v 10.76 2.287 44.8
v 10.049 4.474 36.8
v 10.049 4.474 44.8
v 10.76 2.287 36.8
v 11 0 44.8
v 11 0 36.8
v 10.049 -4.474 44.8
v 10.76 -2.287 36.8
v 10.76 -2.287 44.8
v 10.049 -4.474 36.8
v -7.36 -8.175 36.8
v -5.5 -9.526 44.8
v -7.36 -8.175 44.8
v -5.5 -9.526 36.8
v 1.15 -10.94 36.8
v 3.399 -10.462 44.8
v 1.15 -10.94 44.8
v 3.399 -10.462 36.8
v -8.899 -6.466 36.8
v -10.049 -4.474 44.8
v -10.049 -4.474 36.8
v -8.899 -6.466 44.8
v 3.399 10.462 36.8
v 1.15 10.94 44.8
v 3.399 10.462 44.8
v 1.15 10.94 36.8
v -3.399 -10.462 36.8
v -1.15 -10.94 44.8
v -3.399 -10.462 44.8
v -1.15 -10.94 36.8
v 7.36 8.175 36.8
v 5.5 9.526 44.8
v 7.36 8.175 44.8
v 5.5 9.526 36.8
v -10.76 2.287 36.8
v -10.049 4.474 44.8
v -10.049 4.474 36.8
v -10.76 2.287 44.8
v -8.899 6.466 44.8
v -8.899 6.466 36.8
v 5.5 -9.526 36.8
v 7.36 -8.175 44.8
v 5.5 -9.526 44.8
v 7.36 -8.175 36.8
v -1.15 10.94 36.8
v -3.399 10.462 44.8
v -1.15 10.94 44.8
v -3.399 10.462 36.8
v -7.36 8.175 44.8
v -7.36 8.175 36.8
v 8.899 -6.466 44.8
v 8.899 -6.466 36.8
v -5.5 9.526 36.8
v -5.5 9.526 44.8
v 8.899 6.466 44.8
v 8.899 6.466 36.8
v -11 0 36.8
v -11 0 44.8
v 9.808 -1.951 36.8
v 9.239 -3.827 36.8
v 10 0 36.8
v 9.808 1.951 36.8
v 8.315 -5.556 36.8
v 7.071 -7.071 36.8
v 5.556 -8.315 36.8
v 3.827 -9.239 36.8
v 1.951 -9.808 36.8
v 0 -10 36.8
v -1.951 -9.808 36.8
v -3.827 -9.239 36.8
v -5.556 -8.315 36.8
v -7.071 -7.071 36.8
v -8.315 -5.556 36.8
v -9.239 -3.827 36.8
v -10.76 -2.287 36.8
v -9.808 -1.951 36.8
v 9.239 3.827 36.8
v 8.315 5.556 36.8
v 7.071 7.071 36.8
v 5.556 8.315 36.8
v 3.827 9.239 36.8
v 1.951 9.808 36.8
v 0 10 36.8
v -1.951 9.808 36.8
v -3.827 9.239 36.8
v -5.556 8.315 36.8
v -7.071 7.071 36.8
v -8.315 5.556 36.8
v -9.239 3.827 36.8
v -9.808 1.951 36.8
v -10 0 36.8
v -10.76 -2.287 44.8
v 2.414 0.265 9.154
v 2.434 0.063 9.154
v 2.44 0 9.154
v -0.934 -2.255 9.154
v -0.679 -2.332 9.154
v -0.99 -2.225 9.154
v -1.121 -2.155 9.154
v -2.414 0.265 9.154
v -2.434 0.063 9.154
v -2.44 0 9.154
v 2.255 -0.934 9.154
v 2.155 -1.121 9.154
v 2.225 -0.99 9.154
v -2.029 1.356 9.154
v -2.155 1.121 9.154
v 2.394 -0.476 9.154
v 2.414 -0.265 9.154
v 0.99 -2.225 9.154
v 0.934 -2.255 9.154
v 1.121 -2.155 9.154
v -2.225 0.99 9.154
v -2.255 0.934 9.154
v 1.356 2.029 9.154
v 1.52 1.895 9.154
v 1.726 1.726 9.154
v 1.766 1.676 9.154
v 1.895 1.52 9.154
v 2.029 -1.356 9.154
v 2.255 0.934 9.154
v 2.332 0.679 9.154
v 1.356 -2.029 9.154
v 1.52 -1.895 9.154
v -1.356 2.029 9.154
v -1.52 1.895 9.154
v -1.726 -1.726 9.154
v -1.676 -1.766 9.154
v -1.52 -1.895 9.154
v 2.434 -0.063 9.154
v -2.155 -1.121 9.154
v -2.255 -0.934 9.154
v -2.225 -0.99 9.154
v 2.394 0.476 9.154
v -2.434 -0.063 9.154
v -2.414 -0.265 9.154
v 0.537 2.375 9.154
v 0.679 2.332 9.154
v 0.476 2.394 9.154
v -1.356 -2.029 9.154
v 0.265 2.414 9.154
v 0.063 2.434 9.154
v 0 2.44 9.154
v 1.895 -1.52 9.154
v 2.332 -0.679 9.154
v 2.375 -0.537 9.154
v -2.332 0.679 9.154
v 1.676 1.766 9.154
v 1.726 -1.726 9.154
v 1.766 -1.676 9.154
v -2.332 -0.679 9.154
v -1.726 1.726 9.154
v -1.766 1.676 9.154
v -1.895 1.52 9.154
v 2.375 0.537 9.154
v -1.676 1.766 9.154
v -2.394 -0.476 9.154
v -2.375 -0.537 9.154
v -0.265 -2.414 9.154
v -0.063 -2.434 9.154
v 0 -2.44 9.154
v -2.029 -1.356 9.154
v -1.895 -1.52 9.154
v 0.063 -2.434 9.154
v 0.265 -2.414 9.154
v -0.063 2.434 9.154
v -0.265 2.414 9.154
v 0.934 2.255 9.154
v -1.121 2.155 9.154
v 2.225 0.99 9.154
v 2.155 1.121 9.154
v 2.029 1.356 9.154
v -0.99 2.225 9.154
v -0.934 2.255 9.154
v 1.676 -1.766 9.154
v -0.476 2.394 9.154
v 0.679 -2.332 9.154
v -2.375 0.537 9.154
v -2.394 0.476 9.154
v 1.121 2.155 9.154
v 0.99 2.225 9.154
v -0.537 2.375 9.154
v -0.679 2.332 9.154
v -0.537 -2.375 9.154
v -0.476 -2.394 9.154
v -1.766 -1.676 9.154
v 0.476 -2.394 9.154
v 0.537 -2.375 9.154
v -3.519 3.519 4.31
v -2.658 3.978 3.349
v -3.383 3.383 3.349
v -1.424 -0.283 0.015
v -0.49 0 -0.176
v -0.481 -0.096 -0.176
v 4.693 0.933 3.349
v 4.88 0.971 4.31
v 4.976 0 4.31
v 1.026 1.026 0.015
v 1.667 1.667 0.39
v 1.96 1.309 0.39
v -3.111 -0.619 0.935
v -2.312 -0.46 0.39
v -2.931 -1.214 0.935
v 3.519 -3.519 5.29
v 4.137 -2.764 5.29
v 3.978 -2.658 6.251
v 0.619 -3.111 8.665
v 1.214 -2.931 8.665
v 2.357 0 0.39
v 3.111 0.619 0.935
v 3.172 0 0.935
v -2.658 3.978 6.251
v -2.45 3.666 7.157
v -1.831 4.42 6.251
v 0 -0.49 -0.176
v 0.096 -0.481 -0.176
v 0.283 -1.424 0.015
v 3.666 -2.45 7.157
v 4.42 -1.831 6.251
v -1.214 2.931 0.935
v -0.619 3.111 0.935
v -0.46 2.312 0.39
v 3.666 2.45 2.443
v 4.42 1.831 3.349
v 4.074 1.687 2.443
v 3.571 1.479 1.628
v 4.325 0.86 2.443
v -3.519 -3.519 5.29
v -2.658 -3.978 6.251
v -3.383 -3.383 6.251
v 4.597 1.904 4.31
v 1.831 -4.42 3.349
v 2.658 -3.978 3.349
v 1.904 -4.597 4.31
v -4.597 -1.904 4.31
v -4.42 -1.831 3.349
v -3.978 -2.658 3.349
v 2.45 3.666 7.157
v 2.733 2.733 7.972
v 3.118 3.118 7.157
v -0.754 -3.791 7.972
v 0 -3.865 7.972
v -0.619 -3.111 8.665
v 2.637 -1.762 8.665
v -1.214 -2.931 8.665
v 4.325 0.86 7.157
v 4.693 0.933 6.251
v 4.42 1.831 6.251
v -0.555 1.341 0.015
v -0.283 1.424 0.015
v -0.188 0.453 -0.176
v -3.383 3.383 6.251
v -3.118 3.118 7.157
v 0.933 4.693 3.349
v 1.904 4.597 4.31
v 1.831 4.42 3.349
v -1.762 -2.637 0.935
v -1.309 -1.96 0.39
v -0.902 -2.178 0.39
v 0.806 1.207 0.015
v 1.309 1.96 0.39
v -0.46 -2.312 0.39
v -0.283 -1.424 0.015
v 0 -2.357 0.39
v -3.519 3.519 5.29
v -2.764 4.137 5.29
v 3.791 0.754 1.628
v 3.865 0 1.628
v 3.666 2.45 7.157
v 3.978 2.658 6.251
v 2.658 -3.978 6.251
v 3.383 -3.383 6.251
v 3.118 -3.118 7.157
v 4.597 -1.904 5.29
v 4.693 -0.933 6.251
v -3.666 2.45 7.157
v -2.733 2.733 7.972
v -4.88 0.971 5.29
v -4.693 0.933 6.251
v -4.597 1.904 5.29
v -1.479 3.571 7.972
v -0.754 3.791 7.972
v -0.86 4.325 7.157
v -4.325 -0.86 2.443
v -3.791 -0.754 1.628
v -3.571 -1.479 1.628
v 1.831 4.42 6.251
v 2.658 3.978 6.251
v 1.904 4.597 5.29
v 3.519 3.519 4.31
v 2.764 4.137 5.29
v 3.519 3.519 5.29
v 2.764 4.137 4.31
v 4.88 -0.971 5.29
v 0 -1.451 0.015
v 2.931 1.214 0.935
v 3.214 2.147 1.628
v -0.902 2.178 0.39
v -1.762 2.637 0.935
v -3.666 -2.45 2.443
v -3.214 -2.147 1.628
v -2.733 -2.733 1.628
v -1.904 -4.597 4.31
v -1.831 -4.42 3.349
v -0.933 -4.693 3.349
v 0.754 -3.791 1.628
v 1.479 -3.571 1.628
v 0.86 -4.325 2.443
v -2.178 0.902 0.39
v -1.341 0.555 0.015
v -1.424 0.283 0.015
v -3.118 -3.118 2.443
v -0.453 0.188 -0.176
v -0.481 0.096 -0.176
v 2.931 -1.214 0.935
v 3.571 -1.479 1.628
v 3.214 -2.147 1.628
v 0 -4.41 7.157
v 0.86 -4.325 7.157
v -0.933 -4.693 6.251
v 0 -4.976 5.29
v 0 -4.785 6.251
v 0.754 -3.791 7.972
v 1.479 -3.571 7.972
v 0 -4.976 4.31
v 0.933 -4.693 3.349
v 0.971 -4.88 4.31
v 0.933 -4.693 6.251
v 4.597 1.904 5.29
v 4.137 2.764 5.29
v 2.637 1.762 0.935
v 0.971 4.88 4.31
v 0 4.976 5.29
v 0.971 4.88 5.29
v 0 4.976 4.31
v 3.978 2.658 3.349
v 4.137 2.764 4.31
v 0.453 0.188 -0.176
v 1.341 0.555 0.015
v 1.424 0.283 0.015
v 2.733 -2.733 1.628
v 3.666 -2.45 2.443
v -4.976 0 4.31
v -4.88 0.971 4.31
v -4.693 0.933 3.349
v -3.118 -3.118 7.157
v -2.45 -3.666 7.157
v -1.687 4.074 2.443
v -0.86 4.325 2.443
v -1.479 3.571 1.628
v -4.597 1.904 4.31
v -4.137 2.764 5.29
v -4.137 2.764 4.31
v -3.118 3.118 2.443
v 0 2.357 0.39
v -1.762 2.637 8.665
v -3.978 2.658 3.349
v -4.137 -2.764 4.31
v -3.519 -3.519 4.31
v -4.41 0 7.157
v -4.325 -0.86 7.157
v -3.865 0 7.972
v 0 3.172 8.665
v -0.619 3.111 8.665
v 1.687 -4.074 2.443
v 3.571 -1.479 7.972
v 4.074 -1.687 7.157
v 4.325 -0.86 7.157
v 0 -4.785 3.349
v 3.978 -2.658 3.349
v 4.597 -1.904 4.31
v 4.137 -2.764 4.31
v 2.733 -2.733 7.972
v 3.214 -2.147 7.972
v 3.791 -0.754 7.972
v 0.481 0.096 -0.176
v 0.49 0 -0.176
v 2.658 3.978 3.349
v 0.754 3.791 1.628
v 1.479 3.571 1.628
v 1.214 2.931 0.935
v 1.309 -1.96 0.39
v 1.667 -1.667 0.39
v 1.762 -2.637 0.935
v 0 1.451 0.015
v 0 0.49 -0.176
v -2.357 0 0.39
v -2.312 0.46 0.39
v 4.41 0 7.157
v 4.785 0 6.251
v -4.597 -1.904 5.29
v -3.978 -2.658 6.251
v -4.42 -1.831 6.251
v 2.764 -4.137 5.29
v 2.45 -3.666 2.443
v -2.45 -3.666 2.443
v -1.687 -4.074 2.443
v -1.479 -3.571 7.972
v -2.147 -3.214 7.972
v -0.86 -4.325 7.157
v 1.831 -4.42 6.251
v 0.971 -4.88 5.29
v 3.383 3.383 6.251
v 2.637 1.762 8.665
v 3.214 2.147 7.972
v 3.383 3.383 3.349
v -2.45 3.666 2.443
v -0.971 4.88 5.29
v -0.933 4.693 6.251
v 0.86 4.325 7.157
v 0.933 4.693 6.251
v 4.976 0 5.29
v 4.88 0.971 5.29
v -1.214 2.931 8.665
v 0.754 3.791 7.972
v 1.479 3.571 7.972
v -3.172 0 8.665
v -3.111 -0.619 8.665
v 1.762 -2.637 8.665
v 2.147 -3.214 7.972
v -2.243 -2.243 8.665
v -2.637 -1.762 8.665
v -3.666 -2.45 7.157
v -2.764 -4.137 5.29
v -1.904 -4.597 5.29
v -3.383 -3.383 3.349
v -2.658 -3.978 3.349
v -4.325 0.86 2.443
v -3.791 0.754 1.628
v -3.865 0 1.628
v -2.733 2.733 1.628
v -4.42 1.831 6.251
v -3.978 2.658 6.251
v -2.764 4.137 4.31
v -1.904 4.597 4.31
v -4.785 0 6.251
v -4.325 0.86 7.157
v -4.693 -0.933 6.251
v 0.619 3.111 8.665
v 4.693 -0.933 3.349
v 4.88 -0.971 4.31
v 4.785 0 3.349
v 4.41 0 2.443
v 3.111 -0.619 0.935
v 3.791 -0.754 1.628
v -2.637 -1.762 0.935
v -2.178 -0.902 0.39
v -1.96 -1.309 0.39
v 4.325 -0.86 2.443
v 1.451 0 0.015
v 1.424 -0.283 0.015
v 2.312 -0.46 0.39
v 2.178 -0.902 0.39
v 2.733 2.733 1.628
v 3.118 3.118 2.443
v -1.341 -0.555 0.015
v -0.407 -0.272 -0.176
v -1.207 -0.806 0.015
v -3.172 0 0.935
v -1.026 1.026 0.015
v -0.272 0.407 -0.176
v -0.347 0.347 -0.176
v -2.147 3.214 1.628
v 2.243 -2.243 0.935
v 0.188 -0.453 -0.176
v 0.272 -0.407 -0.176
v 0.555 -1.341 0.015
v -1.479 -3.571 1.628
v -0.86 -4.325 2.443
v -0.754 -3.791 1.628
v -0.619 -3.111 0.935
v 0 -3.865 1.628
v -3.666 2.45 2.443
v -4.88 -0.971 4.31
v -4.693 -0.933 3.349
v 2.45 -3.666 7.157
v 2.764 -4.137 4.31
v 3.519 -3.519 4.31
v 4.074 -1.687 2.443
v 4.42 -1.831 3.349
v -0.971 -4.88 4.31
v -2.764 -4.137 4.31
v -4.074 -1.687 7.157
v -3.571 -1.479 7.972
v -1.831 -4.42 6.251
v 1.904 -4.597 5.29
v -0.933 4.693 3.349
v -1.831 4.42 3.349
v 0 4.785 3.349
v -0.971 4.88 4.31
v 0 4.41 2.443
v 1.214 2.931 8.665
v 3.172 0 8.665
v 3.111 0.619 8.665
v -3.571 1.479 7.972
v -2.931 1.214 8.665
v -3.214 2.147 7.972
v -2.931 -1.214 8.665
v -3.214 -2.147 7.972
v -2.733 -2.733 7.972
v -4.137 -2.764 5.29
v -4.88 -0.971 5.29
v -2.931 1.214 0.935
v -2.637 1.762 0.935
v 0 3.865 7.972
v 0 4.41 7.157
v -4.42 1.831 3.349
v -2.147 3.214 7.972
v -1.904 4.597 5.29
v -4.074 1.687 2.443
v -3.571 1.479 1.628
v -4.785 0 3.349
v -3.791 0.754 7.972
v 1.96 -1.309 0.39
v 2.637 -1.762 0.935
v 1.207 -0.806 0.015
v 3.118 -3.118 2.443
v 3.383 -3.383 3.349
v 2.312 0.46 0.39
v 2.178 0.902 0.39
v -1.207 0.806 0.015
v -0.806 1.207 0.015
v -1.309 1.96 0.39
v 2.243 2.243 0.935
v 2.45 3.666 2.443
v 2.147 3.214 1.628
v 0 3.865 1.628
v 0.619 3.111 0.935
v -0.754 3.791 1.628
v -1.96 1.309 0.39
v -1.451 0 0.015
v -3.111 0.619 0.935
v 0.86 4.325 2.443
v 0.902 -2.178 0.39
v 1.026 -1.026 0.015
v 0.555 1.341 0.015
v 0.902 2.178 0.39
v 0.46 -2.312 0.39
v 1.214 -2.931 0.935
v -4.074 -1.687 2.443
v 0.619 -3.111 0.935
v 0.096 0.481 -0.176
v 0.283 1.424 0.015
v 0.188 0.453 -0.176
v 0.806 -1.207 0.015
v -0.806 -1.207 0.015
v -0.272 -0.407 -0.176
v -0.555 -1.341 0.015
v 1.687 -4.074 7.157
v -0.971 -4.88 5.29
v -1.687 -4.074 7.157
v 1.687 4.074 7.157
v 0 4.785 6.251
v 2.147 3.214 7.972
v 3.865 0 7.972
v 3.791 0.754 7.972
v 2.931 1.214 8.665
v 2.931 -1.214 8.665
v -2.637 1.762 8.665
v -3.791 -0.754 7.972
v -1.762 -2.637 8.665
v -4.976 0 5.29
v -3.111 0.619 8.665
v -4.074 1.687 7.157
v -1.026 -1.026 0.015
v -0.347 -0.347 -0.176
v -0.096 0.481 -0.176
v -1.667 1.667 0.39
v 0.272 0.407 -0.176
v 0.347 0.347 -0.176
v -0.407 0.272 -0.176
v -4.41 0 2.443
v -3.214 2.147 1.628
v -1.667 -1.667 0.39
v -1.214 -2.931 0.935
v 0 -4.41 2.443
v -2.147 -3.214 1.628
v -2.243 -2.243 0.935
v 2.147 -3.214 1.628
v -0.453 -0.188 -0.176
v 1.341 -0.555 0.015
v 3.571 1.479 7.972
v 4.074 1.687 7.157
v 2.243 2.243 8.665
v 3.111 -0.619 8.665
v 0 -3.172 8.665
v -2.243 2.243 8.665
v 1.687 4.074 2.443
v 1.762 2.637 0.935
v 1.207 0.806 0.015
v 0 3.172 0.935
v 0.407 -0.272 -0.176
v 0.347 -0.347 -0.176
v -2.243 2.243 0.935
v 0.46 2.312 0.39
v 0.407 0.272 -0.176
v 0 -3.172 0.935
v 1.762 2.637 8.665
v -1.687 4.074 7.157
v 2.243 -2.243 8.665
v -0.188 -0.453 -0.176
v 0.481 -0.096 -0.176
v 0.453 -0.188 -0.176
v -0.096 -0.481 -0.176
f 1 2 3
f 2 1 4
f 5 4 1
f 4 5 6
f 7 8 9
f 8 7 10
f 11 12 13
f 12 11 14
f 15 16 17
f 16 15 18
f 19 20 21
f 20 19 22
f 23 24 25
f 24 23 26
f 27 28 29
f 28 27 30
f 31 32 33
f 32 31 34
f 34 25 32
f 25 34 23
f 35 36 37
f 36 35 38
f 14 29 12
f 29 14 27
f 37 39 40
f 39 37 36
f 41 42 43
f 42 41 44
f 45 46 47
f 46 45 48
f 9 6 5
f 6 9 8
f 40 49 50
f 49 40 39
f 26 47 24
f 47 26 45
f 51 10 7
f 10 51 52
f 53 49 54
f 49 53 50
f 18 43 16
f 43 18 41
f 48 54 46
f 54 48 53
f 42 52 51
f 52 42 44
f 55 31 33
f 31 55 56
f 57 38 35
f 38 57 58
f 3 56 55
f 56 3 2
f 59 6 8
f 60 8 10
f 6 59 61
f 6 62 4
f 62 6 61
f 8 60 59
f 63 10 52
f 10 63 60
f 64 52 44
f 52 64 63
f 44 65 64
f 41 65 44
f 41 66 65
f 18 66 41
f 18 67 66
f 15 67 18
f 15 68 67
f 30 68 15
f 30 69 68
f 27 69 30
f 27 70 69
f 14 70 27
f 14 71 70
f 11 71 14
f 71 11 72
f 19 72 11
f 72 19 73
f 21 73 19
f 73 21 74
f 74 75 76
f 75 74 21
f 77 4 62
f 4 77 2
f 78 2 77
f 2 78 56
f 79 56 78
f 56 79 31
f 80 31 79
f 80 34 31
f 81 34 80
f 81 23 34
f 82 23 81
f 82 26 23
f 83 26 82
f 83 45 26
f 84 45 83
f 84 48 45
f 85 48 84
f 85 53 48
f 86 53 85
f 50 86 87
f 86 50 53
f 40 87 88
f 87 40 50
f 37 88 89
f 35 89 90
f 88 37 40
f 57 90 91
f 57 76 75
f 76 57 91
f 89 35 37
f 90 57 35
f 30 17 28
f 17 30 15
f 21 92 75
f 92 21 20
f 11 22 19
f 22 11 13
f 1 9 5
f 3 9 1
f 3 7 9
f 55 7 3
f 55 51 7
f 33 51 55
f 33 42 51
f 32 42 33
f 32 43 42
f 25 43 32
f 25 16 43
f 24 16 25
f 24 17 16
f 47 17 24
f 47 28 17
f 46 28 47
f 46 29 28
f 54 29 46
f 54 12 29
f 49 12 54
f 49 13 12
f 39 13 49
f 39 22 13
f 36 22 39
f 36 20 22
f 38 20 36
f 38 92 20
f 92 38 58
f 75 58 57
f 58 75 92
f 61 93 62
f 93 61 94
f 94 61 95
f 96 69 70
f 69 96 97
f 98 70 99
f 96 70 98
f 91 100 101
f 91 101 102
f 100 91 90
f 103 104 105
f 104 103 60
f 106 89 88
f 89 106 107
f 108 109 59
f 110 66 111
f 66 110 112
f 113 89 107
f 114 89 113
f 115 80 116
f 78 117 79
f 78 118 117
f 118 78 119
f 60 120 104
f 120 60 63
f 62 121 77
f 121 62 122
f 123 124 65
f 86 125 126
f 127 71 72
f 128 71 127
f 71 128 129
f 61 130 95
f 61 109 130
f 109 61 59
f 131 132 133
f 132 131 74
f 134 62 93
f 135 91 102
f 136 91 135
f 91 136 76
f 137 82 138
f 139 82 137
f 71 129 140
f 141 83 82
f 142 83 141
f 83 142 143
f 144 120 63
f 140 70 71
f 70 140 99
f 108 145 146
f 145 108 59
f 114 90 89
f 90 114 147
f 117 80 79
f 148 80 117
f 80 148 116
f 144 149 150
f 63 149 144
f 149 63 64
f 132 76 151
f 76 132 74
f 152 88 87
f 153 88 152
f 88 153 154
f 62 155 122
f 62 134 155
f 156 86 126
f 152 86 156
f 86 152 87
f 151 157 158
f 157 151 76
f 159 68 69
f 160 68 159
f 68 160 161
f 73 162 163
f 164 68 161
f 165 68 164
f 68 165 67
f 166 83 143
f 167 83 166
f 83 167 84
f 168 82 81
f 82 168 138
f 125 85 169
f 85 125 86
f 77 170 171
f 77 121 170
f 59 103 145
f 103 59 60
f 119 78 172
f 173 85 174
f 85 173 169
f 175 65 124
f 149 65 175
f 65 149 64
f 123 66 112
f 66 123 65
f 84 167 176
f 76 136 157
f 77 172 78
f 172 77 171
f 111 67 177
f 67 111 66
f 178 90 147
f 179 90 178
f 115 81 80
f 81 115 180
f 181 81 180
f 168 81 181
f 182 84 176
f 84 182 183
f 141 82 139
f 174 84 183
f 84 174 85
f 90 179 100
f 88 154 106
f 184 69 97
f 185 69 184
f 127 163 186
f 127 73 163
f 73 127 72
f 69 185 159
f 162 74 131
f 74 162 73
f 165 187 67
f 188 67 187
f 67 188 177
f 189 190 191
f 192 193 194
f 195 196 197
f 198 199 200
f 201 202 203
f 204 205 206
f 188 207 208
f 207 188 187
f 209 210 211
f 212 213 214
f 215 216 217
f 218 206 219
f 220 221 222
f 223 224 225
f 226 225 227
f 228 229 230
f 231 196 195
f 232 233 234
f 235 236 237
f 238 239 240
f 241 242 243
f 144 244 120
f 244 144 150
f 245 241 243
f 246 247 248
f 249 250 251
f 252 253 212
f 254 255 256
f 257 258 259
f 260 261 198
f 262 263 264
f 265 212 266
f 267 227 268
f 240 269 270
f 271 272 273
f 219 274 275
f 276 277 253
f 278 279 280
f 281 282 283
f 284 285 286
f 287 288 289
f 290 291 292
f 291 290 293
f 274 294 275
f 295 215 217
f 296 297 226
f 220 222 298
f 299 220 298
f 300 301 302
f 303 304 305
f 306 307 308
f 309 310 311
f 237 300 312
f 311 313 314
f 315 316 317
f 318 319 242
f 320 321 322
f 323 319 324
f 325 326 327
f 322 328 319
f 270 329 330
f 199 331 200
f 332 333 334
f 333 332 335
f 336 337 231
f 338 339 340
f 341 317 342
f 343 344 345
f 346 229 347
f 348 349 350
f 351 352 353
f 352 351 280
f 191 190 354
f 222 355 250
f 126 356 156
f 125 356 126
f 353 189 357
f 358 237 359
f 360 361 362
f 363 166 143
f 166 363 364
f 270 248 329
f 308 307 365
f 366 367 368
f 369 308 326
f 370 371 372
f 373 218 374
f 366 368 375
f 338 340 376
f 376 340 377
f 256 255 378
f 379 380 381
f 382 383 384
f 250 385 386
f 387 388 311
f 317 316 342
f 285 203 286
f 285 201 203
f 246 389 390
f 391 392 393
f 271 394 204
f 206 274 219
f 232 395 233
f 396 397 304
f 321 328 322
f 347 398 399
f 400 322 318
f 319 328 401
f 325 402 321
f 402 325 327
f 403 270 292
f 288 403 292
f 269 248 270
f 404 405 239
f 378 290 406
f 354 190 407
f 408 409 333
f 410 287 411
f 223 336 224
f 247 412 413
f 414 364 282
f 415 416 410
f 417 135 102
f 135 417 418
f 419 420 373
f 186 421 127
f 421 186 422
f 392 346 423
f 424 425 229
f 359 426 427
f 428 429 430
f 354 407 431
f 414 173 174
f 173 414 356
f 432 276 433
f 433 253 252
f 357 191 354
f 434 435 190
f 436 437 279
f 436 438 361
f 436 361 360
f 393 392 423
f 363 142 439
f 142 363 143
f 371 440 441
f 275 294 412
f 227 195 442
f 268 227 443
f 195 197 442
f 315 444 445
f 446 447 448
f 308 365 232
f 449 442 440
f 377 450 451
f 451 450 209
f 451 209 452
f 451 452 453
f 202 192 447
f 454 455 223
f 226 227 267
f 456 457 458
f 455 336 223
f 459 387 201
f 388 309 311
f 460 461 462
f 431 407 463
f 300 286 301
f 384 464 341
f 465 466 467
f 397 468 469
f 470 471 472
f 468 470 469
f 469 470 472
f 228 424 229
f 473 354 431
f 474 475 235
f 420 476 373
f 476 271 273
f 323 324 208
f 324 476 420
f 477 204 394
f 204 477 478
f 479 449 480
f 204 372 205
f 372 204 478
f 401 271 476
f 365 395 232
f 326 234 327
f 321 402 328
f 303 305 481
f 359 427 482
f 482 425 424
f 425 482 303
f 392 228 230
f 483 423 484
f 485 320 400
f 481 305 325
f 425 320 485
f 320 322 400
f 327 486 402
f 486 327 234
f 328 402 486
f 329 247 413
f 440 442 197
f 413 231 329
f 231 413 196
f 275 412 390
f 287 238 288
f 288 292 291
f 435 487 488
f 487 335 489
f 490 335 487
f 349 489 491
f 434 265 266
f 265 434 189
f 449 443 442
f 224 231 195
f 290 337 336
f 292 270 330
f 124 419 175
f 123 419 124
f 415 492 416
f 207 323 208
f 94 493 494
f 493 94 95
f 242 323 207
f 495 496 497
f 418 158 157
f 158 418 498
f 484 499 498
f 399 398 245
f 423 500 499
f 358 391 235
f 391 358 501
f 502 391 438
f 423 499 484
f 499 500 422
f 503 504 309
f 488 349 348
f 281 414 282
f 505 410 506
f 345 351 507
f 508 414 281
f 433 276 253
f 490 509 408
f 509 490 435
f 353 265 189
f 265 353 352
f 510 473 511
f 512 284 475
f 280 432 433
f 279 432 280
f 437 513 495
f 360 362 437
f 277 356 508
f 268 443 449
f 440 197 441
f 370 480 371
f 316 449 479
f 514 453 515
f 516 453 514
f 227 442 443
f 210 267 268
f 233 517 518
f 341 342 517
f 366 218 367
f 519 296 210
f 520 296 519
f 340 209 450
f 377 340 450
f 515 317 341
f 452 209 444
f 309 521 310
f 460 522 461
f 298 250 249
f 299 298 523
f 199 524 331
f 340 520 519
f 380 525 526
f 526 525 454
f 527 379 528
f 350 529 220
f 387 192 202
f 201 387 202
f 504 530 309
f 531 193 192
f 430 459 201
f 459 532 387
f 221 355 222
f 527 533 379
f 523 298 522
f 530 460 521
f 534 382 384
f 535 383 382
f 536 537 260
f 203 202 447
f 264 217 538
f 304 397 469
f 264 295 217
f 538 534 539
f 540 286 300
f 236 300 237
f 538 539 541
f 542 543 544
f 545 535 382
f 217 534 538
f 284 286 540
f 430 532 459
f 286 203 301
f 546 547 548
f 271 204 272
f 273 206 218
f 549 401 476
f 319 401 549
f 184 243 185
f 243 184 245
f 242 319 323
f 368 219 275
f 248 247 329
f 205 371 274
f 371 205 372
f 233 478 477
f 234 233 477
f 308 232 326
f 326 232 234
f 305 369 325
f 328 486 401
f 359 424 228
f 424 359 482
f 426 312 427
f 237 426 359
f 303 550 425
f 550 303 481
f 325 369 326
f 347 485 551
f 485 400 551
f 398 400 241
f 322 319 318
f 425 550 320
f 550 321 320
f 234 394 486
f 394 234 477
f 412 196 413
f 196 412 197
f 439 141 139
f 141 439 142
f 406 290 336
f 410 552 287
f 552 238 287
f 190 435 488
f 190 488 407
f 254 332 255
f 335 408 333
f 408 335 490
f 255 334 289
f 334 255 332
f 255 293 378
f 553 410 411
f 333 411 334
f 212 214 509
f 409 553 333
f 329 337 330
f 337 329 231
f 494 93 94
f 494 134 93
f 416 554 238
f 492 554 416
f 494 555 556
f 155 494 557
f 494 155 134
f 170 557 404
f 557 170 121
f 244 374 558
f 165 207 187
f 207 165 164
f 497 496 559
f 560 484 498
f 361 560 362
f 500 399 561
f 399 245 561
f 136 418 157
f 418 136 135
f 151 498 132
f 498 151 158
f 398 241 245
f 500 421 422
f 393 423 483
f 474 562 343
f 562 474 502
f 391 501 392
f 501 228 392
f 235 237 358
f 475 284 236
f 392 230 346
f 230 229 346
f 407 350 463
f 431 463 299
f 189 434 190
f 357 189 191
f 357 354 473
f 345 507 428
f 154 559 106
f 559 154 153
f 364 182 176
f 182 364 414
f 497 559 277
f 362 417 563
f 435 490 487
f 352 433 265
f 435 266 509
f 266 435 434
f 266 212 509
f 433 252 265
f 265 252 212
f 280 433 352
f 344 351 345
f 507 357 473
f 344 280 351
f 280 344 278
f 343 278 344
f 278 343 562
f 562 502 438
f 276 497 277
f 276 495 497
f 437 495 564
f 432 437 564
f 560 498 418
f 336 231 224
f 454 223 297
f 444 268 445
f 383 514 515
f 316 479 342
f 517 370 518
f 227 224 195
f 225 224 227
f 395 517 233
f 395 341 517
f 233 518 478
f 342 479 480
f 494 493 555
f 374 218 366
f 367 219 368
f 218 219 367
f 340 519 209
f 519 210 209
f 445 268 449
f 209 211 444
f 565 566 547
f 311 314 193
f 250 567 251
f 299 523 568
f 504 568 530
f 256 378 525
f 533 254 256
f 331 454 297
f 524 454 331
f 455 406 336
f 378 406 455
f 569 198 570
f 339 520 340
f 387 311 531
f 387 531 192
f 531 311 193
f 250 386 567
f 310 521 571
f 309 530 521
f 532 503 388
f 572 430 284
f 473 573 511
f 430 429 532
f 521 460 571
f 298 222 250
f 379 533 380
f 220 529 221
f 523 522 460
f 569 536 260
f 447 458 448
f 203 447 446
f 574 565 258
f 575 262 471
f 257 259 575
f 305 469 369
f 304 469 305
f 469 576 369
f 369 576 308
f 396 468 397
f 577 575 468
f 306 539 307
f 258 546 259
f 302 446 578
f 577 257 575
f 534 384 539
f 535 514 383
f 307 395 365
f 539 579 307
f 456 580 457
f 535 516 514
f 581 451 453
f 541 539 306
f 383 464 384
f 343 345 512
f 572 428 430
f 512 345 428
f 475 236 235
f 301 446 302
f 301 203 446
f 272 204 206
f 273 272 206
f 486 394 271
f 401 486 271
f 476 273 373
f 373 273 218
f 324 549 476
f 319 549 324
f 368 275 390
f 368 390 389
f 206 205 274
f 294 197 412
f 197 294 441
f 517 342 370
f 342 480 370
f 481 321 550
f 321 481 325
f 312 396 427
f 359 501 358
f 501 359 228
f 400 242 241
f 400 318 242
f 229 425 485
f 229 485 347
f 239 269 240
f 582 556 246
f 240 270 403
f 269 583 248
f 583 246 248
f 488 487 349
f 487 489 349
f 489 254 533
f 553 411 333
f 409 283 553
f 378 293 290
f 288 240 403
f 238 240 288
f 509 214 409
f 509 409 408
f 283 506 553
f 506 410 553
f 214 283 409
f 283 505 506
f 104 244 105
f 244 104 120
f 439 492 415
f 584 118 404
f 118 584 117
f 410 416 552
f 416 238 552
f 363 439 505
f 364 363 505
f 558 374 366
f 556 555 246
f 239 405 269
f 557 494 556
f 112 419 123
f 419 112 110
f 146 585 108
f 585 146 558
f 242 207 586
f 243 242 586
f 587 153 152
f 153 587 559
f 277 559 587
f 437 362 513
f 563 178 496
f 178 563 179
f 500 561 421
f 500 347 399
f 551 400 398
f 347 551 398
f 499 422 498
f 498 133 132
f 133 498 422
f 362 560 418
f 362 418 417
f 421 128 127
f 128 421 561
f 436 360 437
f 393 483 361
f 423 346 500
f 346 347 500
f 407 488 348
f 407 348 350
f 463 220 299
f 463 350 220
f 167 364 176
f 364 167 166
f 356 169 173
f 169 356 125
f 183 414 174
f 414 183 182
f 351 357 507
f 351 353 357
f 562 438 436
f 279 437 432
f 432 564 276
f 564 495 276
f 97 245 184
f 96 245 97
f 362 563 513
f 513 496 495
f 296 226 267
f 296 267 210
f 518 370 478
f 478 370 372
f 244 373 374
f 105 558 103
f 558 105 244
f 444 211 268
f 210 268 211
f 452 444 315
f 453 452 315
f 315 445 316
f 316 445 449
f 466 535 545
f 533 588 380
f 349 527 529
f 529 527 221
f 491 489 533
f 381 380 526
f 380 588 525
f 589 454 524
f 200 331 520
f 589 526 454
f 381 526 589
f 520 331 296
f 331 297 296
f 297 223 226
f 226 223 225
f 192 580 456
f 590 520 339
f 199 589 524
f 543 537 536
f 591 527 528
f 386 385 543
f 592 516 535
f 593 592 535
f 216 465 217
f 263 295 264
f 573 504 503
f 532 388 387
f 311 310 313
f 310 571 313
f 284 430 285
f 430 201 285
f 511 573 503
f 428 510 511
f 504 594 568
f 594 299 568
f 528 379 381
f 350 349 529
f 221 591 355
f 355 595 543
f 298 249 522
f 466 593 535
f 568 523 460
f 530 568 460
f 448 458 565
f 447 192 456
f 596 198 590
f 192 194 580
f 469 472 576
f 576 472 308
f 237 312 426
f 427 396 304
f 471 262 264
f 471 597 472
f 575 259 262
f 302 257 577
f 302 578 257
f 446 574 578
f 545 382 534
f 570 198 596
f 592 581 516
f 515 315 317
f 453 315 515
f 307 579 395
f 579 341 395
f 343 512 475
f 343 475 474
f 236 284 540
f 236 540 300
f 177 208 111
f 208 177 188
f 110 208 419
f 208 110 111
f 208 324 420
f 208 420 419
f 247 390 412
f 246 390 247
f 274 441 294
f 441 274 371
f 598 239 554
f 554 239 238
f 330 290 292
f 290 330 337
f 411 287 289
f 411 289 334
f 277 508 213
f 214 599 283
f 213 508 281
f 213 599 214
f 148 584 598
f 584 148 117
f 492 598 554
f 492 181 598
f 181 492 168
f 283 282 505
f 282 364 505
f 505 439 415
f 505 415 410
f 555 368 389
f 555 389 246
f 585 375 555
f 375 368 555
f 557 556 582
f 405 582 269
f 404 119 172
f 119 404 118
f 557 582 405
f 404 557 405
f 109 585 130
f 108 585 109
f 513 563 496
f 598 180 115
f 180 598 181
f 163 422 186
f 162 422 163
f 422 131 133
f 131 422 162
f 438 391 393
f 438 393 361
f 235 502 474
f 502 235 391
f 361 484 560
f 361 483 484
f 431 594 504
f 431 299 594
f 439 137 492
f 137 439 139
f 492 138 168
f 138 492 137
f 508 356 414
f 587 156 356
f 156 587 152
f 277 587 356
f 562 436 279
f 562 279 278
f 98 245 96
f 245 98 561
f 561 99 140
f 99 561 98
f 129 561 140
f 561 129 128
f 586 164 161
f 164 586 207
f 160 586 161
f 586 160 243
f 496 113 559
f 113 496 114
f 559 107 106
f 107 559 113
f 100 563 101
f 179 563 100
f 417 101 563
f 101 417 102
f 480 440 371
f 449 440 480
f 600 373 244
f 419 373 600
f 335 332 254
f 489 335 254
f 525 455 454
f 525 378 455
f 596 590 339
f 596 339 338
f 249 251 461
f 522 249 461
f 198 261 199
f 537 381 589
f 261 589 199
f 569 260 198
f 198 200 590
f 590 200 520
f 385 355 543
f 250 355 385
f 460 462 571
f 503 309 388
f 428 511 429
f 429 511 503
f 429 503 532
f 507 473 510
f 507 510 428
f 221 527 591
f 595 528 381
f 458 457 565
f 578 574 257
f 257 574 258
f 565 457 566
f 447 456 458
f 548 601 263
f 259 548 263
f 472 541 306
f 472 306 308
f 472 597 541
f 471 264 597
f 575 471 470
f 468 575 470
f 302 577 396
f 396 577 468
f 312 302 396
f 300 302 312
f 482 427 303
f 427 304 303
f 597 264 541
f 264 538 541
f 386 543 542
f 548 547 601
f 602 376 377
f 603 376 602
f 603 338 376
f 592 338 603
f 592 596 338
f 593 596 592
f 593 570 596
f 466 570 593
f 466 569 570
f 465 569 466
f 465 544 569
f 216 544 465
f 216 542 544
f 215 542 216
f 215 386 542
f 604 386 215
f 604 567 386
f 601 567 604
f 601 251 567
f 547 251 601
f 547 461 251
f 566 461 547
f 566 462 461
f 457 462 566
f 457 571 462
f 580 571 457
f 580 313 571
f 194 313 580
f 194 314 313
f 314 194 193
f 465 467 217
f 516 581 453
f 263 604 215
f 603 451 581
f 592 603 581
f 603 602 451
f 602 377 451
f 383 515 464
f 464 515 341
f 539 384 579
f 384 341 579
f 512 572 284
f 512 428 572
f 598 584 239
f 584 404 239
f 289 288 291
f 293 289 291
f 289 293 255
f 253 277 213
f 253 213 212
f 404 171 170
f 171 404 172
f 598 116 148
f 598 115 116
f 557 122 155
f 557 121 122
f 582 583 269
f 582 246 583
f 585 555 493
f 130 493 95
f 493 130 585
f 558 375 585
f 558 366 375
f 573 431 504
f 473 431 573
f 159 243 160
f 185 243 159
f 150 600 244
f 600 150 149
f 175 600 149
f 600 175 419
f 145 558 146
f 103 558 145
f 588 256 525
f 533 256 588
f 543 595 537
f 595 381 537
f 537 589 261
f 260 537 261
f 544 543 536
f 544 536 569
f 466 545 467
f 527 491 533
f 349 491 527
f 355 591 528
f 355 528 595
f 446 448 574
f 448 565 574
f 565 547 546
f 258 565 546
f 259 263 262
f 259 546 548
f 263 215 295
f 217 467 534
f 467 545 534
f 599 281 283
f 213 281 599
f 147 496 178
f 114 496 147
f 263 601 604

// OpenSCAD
cellsz = 40;
cell_z = 5;
base_r = cellsz / 4;
h_def  = cellsz * 0.8;
h_base = cellsz * 0.2;
r_top = cellsz * 0.125;


module pawn( color )
{
  color(color) union()
  {
    cylinder( h=h_base, r1=base_r*1.1, r2=base_r*1.1 );
    translate([0,0,h_base]) {
      cylinder( h=h_def, r1=base_r, r2=base_r/8, $fn=32 );
    }
    translate([0,0,h_base+h_def]) {
      sphere( r=r_top, $fn=32 );
    }
  }
}

//translate( [i*cellsz, row*cellsz, -cell_z] ) {
translate([0,0,h_def*1.4]) mirror([0,0,1])
  pawn("red");
//}
